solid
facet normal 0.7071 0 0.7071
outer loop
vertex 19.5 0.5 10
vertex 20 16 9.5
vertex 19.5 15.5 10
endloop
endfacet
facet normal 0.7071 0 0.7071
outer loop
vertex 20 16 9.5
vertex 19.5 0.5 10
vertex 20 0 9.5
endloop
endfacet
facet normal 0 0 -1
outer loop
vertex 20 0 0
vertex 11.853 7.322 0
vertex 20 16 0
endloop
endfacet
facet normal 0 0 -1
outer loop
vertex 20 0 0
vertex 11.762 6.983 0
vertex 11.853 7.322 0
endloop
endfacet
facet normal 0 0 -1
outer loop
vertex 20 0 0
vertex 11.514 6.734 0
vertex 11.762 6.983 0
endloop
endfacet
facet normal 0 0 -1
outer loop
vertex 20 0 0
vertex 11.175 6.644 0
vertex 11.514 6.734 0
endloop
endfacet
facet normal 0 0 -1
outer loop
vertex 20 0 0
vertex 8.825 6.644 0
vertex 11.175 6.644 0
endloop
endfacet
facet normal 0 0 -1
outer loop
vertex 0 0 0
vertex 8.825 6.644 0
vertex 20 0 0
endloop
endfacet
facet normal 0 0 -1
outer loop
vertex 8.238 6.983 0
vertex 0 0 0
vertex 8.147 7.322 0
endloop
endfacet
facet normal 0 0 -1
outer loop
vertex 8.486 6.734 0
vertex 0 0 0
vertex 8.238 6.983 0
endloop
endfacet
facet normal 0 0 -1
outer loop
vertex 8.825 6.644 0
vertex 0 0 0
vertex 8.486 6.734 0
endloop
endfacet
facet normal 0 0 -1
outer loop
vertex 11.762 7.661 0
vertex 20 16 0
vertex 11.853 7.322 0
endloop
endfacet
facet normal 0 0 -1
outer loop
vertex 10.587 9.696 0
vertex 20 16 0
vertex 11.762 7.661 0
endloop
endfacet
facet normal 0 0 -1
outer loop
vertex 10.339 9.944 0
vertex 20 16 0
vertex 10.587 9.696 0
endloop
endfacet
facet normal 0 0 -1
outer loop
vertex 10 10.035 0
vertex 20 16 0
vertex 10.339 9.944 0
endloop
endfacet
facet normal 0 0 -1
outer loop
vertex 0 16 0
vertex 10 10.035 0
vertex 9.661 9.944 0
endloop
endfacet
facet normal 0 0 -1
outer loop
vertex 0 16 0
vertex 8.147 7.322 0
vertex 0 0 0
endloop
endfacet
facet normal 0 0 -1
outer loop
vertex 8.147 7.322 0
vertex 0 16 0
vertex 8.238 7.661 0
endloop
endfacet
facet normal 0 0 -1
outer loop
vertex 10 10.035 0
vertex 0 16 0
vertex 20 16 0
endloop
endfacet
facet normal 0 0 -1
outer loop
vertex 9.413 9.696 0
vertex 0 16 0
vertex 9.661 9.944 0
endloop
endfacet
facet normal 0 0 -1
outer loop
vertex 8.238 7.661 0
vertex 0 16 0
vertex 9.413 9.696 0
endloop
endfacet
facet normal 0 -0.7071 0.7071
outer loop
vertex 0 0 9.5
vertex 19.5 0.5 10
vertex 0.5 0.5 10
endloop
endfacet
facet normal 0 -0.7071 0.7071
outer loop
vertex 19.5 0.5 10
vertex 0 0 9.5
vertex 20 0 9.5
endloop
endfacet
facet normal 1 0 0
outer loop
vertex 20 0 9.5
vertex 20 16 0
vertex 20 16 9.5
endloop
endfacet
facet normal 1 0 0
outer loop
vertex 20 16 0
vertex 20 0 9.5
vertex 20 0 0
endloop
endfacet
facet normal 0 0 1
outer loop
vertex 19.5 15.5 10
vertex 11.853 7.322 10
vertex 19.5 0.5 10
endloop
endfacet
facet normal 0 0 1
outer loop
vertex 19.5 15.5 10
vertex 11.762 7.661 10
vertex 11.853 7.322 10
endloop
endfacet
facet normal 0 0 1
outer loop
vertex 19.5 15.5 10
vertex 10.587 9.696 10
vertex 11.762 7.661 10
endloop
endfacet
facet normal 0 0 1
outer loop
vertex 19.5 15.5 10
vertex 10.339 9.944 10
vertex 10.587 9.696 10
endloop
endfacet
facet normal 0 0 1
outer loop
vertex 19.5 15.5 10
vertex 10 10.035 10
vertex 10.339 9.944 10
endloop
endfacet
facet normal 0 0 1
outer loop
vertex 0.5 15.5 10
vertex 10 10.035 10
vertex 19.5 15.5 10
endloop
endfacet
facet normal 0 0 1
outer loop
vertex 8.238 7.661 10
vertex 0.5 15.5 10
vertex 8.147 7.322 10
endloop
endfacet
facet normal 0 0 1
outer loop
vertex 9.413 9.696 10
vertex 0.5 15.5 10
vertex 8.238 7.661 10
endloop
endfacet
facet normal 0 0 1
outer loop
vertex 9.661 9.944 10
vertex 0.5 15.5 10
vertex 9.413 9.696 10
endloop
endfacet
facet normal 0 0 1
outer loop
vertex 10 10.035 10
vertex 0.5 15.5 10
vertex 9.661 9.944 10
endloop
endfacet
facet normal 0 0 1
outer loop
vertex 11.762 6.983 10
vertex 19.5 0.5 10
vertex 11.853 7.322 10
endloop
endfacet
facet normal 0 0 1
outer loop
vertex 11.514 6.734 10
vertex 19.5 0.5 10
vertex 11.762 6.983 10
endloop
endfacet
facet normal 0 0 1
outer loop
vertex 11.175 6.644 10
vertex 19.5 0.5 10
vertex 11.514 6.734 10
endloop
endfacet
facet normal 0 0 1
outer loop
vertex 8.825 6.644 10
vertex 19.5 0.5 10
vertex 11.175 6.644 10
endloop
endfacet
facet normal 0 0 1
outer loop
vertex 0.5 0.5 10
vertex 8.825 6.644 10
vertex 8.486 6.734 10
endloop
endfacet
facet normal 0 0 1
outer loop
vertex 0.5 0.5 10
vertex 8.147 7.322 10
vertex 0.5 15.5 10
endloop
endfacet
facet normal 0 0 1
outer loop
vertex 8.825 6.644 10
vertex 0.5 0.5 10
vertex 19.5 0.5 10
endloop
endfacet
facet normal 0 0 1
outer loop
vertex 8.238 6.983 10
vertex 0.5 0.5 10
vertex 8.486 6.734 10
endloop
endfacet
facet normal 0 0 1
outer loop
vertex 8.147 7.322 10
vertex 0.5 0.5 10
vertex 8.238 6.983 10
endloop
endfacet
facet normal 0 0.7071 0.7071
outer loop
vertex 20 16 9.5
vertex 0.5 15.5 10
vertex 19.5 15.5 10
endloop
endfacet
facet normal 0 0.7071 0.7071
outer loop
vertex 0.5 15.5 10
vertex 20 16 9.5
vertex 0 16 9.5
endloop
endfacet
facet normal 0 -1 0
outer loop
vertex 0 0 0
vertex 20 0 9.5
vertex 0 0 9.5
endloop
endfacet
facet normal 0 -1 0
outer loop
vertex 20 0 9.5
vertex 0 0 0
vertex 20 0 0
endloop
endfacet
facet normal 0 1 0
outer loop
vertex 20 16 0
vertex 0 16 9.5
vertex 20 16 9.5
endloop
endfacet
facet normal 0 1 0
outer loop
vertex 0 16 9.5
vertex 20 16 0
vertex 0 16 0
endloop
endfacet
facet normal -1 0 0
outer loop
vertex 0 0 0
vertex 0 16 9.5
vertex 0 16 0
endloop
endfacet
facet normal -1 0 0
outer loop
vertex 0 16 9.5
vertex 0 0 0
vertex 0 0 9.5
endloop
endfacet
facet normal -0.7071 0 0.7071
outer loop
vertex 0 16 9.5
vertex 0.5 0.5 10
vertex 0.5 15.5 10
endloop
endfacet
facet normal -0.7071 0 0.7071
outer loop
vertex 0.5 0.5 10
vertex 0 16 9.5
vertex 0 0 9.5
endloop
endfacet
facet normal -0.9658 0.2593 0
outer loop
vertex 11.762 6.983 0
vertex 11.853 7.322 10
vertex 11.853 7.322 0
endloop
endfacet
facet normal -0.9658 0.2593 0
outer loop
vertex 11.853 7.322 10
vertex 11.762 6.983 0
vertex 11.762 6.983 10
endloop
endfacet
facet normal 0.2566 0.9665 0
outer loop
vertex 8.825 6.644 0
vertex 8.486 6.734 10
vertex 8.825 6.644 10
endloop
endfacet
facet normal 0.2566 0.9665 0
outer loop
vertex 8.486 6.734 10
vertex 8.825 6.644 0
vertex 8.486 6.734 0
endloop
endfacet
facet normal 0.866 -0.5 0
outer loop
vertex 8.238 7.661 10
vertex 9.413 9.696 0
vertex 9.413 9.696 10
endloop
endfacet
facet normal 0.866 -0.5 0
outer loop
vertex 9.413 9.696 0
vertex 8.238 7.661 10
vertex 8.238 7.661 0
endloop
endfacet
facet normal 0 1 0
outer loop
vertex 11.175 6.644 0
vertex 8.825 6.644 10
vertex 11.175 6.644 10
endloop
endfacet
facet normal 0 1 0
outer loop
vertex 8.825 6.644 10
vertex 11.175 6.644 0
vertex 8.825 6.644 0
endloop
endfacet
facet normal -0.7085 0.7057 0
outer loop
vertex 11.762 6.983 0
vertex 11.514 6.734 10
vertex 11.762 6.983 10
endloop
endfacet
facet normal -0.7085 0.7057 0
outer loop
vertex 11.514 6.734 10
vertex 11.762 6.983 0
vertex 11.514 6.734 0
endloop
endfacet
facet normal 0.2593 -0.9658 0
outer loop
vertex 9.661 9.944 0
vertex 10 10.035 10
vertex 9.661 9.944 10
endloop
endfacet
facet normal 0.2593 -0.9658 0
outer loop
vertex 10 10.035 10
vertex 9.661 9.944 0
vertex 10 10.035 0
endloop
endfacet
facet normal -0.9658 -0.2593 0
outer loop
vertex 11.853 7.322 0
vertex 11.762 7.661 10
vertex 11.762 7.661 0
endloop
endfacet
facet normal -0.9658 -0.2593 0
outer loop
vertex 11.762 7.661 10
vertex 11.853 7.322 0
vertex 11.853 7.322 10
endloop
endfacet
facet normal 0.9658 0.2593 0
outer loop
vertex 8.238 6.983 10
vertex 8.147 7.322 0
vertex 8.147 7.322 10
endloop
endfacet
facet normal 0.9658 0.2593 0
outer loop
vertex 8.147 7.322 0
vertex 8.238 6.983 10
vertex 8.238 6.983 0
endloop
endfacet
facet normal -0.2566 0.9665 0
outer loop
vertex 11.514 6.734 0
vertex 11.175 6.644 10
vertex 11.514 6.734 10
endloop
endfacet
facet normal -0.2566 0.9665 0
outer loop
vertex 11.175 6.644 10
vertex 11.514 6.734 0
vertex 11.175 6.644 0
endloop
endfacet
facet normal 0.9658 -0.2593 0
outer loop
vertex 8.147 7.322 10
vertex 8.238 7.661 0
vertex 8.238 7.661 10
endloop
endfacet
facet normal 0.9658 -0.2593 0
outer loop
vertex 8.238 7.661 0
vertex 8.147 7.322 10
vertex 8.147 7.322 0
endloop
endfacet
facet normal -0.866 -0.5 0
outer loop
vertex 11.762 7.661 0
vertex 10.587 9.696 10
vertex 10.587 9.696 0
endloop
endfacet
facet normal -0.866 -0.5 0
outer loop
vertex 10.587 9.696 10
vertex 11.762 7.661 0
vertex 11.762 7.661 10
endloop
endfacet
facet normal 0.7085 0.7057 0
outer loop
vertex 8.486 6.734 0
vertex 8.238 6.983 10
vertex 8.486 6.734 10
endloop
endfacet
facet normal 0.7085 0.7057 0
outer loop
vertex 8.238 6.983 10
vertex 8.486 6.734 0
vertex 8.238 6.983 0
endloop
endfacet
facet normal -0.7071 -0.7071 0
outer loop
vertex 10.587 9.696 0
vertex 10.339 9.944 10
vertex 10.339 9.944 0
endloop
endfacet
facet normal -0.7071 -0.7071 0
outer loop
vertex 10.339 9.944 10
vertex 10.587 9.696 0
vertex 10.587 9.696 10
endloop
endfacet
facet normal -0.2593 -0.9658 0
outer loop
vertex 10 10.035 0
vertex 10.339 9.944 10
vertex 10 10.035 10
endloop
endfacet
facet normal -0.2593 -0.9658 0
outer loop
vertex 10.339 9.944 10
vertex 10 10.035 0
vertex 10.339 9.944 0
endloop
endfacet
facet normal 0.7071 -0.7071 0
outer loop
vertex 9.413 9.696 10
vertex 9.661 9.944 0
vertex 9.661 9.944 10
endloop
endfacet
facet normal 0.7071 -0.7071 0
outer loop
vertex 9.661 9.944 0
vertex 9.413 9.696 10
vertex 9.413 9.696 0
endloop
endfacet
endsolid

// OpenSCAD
// Plastic self-tap hole (MIT). Inline selftap_hole into model.scad.
// Geometry after OpenEng (MIT): https://gitlab.com/bath_open_instrumentation_group/openeng
// Machine screw into printed plastic — not a heat-set insert.
$fa = 4;
$fs = 0.4;

/* [Block] */

// Block length along X (mm).
block_length = 20; // [12:1:40]

// Block width along Y (mm).
block_width = 16; // [12:1:32]

// Block height along Z (mm).
block_height = 10; // [6:0.5:20]

// Metric screw size the hole should tap (mm). M3 → 3.
screw_nominal = 3; // [2:0.5:6]

/* [Rendering] */

// Mid-tone preview color.
block_color = "#3D6B7A"; // color

/* [Hidden] */

// Extra diameter for FDM squish (mm).
splodge = 0.2;

// Bed-face chamfer (elephant-foot relief).
bed_chamfer = 0.5;

selftap_block();

module selftap_block(
    block_length = block_length,
    block_width = block_width,
    block_height = block_height,
    screw_nominal = screw_nominal,
    block_color = block_color,
    splodge = splodge,
    bed_chamfer = bed_chamfer
) {
    color(block_color)
    difference() {
        hull() {
            cube([block_length, block_width, block_height - bed_chamfer]);
            translate([bed_chamfer, bed_chamfer, 0])
                cube([
                    block_length - 2 * bed_chamfer,
                    block_width - 2 * bed_chamfer,
                    block_height
                ]);
        }
        translate([block_length / 2, block_width / 2, -0.1])
            selftap_hole_metric(screw_nominal, h = block_height + 0.2, splodge = splodge);
    }
}

// --- copy from here (MIT self-tap; after OpenEng) ---

function metric_coarse_pitch(screw_d) =
    screw_d <= 2 ? 0.4 :
    screw_d <= 2.5 ? 0.45 :
    screw_d <= 3 ? 0.5 :
    screw_d <= 4 ? 0.7 :
    screw_d <= 5 ? 0.8 : 1.0;

// 75% thread engagement tap diameter (OpenEng).
function tap_diameter(screw_d, pitch) = screw_d - pitch * sqrt(3) * 0.75 * 0.75;

module trylinder(r = 1, flat = 1, h = 1, center = false) {
    hull()
        for (a = [0, 120, 240])
            rotate([0, 0, a])
                translate([0, flat / sqrt(3), 0])
                    cylinder(r = r, h = h, center = center, $fn = 12);
}

module selftap_hole(nominal_d, h = 10, center = false, splodge = 0.2) {
    r = (nominal_d + splodge) / 2;
    flat = (r / 2) * (2 * sqrt(3));
    trylinder(r = r / 2, flat = flat, h = h, center = center);
}

module selftap_hole_metric(screw_d, h = 10, center = false, splodge = 0.2) {
    selftap_hole(
        tap_diameter(screw_d, metric_coarse_pitch(screw_d)),
        h = h,
        center = center,
        splodge = splodge
    );
}

// --- copy until here ---
